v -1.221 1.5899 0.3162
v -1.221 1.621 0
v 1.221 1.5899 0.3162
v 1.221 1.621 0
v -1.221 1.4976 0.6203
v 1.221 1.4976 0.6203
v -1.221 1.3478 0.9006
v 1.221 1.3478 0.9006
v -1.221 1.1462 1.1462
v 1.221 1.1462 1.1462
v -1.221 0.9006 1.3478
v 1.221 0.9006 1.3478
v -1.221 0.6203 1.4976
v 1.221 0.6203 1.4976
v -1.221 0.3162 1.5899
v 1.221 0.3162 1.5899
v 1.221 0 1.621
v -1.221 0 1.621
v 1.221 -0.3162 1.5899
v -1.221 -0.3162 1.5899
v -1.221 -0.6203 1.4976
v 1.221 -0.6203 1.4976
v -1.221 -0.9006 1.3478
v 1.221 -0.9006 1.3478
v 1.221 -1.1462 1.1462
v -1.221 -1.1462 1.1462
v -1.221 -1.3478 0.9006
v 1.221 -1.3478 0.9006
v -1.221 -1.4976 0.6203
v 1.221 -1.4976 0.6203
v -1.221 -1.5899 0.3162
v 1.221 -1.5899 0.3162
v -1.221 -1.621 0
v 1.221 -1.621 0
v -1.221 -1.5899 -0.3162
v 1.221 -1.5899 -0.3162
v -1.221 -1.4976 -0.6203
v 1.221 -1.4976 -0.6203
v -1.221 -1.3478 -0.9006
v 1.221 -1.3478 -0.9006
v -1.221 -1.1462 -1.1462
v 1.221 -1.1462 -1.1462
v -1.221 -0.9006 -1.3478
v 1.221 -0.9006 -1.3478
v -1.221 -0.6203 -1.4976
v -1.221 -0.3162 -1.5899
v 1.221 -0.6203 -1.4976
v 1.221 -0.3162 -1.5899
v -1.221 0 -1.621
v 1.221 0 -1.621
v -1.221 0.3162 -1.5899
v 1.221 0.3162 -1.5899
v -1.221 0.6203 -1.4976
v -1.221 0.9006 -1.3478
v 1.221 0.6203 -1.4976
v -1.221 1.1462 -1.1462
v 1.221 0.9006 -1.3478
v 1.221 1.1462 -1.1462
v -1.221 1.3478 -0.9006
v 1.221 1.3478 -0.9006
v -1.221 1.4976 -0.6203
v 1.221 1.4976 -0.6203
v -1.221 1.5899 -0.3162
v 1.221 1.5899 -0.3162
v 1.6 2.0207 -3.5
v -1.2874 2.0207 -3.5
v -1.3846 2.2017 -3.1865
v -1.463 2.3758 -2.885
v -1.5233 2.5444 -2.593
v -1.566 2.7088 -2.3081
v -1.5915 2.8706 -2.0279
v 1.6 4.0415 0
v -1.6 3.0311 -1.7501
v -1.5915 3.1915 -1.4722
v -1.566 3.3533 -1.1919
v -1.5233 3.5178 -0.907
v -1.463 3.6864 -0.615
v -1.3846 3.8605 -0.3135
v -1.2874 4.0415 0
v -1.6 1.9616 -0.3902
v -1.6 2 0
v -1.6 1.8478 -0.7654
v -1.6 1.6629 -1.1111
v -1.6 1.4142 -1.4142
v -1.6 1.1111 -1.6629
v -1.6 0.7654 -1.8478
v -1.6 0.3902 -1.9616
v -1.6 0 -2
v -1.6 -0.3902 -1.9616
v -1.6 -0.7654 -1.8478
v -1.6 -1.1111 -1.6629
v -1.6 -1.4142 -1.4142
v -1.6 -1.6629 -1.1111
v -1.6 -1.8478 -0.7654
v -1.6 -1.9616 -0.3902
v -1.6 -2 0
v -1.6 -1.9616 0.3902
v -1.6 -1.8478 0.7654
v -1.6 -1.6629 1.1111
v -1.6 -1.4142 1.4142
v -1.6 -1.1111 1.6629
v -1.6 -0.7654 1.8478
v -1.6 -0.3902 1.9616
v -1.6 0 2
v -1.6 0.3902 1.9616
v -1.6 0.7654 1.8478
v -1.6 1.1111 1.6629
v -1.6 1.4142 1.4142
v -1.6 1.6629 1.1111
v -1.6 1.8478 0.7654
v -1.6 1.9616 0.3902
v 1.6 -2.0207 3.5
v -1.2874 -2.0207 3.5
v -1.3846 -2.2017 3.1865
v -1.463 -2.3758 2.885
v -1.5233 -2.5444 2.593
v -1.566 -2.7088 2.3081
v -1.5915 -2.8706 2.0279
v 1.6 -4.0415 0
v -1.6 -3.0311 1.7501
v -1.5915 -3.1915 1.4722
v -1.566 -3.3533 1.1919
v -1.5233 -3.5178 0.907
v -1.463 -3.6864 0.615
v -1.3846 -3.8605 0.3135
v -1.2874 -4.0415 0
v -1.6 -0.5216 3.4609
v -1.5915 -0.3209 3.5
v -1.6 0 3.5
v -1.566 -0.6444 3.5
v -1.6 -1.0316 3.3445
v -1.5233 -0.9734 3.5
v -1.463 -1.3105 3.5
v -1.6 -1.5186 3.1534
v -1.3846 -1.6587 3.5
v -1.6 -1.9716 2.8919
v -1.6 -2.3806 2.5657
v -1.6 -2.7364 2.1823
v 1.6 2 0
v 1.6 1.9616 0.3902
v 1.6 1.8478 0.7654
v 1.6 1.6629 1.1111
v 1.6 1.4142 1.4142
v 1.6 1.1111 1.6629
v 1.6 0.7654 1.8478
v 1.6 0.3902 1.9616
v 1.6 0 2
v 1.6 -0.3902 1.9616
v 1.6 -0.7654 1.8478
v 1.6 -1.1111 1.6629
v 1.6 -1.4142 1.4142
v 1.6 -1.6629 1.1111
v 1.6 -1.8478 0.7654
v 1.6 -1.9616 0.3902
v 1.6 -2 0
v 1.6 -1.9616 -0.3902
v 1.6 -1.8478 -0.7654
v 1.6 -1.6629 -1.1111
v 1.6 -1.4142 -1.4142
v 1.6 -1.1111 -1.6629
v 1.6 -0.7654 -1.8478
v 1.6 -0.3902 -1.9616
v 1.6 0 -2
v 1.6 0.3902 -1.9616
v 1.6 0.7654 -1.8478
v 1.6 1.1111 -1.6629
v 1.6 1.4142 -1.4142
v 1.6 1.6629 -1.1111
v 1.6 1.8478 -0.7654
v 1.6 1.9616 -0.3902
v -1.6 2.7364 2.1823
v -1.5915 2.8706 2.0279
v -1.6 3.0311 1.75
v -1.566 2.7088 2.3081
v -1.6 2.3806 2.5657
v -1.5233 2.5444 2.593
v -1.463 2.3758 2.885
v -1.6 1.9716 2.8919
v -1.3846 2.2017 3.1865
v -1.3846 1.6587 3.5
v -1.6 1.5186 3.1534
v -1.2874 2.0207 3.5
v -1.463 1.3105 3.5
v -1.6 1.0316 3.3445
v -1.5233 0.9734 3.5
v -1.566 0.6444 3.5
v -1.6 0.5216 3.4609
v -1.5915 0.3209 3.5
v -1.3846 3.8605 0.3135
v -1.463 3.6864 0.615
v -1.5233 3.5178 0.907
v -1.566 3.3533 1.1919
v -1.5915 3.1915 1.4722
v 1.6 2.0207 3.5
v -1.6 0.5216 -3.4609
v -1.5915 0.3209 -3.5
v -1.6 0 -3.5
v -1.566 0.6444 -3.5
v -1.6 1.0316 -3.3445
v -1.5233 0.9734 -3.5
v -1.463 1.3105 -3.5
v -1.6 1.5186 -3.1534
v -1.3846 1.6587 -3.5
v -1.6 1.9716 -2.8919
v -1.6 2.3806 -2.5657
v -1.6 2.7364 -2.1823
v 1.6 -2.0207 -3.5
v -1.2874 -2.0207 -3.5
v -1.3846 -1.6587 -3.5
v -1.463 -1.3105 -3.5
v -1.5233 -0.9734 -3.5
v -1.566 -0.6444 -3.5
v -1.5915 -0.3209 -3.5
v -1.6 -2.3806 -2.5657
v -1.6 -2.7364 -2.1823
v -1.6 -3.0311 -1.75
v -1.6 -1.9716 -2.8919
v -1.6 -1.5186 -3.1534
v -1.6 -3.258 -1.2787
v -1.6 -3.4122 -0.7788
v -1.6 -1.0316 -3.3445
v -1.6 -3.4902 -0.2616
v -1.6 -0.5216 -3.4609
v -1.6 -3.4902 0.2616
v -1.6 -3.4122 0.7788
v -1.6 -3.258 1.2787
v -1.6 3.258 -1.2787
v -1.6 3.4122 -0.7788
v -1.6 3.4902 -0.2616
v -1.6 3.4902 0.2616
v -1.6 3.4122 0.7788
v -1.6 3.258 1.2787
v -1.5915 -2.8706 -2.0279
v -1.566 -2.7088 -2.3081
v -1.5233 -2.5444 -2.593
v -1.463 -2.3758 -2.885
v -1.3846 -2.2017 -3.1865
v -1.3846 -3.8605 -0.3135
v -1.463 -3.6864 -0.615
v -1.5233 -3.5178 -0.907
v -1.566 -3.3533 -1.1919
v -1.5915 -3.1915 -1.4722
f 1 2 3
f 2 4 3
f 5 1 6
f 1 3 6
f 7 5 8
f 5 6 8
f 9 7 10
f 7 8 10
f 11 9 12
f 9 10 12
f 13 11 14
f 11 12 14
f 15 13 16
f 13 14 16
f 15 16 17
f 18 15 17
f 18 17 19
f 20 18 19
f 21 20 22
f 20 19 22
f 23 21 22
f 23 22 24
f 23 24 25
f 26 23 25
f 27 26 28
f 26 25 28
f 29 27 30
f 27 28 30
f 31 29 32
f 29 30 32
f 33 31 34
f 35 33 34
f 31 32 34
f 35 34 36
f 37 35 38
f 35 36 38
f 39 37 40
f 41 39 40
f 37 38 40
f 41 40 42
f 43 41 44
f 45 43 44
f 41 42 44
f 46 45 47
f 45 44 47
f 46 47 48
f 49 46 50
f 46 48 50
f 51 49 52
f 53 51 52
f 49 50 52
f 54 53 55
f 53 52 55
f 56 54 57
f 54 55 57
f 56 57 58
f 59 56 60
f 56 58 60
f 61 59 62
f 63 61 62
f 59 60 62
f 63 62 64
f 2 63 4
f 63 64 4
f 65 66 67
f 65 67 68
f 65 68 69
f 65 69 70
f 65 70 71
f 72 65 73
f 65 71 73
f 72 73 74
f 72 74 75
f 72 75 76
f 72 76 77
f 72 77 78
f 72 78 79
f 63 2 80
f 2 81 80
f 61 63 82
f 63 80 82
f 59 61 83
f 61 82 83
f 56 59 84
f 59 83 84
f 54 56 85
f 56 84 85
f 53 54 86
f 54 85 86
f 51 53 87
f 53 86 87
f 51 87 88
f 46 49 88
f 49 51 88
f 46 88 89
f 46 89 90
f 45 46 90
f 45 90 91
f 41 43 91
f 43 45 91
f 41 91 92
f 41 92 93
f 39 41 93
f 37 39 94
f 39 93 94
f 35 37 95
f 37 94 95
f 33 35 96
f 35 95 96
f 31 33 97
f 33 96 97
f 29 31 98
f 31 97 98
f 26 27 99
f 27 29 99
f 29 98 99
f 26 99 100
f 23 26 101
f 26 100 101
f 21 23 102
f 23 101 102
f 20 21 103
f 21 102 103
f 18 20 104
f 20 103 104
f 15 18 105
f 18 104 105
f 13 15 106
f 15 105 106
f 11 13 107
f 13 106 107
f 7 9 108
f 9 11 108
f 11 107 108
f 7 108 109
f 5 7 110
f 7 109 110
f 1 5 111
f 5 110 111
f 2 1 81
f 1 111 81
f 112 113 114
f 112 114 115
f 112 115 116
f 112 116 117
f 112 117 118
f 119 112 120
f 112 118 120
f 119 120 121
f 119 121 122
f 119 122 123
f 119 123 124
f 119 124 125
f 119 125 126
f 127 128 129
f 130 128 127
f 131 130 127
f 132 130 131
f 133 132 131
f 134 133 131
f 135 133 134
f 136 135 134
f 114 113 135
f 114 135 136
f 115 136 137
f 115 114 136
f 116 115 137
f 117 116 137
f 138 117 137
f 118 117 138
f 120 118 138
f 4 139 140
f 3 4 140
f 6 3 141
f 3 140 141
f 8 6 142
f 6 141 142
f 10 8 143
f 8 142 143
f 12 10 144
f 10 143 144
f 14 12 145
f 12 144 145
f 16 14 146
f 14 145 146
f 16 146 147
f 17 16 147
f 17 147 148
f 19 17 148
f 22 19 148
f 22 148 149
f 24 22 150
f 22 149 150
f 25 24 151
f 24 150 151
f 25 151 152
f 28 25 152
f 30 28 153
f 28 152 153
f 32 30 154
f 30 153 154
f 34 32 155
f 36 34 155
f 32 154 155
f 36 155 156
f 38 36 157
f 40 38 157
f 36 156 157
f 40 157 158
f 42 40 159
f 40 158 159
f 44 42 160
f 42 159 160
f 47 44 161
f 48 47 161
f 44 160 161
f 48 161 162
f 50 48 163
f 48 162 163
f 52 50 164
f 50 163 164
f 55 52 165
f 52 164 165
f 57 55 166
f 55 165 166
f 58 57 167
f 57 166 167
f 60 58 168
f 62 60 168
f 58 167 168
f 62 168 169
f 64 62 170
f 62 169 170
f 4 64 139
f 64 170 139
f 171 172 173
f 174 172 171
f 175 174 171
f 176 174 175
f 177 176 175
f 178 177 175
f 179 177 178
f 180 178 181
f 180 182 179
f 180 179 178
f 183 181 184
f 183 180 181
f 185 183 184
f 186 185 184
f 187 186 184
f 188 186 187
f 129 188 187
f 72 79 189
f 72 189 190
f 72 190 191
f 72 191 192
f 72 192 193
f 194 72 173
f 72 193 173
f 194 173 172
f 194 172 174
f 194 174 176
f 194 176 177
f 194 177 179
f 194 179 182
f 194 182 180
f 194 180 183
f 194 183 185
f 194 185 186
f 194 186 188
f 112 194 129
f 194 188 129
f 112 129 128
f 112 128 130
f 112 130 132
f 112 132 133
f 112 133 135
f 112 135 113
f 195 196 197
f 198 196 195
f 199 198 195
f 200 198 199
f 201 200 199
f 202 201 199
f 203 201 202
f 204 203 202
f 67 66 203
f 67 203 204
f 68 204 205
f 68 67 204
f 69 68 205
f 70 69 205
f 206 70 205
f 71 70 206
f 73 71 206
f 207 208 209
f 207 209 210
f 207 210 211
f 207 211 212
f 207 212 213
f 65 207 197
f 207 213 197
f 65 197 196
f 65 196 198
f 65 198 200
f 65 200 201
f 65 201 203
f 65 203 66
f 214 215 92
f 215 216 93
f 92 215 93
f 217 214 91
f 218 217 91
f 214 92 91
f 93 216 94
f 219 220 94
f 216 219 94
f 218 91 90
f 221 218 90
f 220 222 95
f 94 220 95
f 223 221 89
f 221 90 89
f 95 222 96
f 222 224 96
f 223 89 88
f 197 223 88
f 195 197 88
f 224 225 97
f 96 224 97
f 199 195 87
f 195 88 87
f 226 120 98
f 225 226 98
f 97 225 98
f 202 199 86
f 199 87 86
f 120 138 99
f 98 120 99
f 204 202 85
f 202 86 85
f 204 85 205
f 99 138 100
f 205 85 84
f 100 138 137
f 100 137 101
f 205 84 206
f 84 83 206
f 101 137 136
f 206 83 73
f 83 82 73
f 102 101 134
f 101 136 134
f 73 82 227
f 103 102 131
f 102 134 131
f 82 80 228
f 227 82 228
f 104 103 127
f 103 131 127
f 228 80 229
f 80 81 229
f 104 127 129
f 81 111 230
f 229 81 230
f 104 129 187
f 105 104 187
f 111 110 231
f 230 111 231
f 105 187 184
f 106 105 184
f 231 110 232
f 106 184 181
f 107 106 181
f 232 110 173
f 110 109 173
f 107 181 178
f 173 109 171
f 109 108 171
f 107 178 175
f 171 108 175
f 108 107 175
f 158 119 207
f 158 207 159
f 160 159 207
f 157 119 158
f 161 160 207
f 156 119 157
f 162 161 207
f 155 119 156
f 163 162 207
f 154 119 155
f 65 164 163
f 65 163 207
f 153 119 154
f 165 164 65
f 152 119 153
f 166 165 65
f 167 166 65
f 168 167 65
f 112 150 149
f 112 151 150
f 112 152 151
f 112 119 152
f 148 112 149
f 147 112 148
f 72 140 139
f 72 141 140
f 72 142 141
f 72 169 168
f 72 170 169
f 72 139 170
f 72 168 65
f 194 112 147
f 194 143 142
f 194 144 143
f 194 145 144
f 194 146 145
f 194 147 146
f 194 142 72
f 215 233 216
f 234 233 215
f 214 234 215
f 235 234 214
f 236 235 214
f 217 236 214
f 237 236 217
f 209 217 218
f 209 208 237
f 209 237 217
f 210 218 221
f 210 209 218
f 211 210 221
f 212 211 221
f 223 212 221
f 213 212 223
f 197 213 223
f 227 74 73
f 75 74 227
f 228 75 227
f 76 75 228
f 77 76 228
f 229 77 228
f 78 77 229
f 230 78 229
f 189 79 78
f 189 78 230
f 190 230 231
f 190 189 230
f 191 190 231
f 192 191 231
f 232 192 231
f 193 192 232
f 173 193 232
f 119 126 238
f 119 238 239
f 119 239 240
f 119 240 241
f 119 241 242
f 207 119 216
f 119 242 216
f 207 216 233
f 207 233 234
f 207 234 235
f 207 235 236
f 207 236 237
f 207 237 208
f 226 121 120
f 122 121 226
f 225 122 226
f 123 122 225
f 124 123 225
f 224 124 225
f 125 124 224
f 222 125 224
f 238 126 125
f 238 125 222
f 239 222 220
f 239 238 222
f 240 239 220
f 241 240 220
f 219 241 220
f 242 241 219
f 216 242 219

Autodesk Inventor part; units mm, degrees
sketch "Sketch_1" plane through (0, 0, 0) normal (0, 0, 1) x (1, 0, 0)
  line L0 (1.6, 0) -> (-1.6, 0)
  line L1 (-1.6, 0) -> (-1.6, 3.5)
  line L2 (-1.6, 3.5) -> (-1.2825, 4.05)
  line L3 (-1.2825, 4.05) -> (1.6, 4.05)
  line L4 (1.6, 4.05) -> (1.6, 0)
  line L5 (1.6, 0) -> (-1.6, 0)
revolve "Revolution1" add sketch "Sketch_1" angle 360 about axis through (1.6, 0, 0) along (1, 0, 0)
sketch "Sketch_2" plane through (0, 0, 0) normal (0, 0, 1) x (1, 0, 0)
  line L0 (1.6, 0) -> (-1.6, 0)
  line L1 (-1.6, 0) -> (-1.6, 2)
  line L2 (-1.6, 2) -> (-1.221, 1.621)
  line L3 (-1.221, 1.621) -> (1.221, 1.621)
  line L4 (1.221, 1.621) -> (1.6, 2)
  line L5 (1.6, 2) -> (1.6, 0)
  line L6 (1.6, 0) -> (-1.6, 0)
revolve "Revolution2" cut sketch "Sketch_2" angle 360 about axis through (1.6, 0, 0) along (1, 0, 0)
thread "Thread1" size "M4x0.7" class "6H" standard "ISO Metric profile" full length
sketch "Sketch_3" plane through (0, 0, 0) normal (1, 0, 0) x (0, 1, 0)
  line L0 (-7, 7) -> (-7, -7)
  line L1 (-7, -7) -> (7, -7)
  line L2 (7, -7) -> (7, 7)
  line L3 (7, 7) -> (-7, 7)
  line L4 (-2.0207, 3.5) -> (-4.0415, 0)
  line L5 (-4.0415, 0) -> (-2.0207, -3.5)
  line L6 (-2.0207, -3.5) -> (2.0207, -3.5)
  line L7 (2.0207, -3.5) -> (4.0415, 0)
  line L8 (4.0415, 0) -> (2.0207, 3.5)
  line L9 (2.0207, 3.5) -> (-2.0207, 3.5)
extrude "Extrusion1" cut sketch "Sketch_3" along normal mid plane 3.2
ref_plane "cp_XY" through (1.6, 0, 0) normal (1, 0, 0) x (0, 0, -1)
ref_plane "cp_YZ" through (1.6, 0, 0) normal (0, 0, -1) x (0, 1, 0)
ref_plane "cp_ZX" through (1.6, 0, 0) normal (0, 1, 0) x (1, 0, 0)
ref_plane "nut_to_screw_XY" through (0, 0, 0) normal (1, 0, 0) x (0, 0, -1)
ref_plane "nut_to_screw_YZ" through (0, 0, 0) normal (0, 0, -1) x (0, 1, 0)
ref_plane "nut_to_screw_ZX" through (0, 0, 0) normal (0, 1, 0) x (1, 0, 0)
properties part number "LBNR4" material "鋼、炭素鋼"
